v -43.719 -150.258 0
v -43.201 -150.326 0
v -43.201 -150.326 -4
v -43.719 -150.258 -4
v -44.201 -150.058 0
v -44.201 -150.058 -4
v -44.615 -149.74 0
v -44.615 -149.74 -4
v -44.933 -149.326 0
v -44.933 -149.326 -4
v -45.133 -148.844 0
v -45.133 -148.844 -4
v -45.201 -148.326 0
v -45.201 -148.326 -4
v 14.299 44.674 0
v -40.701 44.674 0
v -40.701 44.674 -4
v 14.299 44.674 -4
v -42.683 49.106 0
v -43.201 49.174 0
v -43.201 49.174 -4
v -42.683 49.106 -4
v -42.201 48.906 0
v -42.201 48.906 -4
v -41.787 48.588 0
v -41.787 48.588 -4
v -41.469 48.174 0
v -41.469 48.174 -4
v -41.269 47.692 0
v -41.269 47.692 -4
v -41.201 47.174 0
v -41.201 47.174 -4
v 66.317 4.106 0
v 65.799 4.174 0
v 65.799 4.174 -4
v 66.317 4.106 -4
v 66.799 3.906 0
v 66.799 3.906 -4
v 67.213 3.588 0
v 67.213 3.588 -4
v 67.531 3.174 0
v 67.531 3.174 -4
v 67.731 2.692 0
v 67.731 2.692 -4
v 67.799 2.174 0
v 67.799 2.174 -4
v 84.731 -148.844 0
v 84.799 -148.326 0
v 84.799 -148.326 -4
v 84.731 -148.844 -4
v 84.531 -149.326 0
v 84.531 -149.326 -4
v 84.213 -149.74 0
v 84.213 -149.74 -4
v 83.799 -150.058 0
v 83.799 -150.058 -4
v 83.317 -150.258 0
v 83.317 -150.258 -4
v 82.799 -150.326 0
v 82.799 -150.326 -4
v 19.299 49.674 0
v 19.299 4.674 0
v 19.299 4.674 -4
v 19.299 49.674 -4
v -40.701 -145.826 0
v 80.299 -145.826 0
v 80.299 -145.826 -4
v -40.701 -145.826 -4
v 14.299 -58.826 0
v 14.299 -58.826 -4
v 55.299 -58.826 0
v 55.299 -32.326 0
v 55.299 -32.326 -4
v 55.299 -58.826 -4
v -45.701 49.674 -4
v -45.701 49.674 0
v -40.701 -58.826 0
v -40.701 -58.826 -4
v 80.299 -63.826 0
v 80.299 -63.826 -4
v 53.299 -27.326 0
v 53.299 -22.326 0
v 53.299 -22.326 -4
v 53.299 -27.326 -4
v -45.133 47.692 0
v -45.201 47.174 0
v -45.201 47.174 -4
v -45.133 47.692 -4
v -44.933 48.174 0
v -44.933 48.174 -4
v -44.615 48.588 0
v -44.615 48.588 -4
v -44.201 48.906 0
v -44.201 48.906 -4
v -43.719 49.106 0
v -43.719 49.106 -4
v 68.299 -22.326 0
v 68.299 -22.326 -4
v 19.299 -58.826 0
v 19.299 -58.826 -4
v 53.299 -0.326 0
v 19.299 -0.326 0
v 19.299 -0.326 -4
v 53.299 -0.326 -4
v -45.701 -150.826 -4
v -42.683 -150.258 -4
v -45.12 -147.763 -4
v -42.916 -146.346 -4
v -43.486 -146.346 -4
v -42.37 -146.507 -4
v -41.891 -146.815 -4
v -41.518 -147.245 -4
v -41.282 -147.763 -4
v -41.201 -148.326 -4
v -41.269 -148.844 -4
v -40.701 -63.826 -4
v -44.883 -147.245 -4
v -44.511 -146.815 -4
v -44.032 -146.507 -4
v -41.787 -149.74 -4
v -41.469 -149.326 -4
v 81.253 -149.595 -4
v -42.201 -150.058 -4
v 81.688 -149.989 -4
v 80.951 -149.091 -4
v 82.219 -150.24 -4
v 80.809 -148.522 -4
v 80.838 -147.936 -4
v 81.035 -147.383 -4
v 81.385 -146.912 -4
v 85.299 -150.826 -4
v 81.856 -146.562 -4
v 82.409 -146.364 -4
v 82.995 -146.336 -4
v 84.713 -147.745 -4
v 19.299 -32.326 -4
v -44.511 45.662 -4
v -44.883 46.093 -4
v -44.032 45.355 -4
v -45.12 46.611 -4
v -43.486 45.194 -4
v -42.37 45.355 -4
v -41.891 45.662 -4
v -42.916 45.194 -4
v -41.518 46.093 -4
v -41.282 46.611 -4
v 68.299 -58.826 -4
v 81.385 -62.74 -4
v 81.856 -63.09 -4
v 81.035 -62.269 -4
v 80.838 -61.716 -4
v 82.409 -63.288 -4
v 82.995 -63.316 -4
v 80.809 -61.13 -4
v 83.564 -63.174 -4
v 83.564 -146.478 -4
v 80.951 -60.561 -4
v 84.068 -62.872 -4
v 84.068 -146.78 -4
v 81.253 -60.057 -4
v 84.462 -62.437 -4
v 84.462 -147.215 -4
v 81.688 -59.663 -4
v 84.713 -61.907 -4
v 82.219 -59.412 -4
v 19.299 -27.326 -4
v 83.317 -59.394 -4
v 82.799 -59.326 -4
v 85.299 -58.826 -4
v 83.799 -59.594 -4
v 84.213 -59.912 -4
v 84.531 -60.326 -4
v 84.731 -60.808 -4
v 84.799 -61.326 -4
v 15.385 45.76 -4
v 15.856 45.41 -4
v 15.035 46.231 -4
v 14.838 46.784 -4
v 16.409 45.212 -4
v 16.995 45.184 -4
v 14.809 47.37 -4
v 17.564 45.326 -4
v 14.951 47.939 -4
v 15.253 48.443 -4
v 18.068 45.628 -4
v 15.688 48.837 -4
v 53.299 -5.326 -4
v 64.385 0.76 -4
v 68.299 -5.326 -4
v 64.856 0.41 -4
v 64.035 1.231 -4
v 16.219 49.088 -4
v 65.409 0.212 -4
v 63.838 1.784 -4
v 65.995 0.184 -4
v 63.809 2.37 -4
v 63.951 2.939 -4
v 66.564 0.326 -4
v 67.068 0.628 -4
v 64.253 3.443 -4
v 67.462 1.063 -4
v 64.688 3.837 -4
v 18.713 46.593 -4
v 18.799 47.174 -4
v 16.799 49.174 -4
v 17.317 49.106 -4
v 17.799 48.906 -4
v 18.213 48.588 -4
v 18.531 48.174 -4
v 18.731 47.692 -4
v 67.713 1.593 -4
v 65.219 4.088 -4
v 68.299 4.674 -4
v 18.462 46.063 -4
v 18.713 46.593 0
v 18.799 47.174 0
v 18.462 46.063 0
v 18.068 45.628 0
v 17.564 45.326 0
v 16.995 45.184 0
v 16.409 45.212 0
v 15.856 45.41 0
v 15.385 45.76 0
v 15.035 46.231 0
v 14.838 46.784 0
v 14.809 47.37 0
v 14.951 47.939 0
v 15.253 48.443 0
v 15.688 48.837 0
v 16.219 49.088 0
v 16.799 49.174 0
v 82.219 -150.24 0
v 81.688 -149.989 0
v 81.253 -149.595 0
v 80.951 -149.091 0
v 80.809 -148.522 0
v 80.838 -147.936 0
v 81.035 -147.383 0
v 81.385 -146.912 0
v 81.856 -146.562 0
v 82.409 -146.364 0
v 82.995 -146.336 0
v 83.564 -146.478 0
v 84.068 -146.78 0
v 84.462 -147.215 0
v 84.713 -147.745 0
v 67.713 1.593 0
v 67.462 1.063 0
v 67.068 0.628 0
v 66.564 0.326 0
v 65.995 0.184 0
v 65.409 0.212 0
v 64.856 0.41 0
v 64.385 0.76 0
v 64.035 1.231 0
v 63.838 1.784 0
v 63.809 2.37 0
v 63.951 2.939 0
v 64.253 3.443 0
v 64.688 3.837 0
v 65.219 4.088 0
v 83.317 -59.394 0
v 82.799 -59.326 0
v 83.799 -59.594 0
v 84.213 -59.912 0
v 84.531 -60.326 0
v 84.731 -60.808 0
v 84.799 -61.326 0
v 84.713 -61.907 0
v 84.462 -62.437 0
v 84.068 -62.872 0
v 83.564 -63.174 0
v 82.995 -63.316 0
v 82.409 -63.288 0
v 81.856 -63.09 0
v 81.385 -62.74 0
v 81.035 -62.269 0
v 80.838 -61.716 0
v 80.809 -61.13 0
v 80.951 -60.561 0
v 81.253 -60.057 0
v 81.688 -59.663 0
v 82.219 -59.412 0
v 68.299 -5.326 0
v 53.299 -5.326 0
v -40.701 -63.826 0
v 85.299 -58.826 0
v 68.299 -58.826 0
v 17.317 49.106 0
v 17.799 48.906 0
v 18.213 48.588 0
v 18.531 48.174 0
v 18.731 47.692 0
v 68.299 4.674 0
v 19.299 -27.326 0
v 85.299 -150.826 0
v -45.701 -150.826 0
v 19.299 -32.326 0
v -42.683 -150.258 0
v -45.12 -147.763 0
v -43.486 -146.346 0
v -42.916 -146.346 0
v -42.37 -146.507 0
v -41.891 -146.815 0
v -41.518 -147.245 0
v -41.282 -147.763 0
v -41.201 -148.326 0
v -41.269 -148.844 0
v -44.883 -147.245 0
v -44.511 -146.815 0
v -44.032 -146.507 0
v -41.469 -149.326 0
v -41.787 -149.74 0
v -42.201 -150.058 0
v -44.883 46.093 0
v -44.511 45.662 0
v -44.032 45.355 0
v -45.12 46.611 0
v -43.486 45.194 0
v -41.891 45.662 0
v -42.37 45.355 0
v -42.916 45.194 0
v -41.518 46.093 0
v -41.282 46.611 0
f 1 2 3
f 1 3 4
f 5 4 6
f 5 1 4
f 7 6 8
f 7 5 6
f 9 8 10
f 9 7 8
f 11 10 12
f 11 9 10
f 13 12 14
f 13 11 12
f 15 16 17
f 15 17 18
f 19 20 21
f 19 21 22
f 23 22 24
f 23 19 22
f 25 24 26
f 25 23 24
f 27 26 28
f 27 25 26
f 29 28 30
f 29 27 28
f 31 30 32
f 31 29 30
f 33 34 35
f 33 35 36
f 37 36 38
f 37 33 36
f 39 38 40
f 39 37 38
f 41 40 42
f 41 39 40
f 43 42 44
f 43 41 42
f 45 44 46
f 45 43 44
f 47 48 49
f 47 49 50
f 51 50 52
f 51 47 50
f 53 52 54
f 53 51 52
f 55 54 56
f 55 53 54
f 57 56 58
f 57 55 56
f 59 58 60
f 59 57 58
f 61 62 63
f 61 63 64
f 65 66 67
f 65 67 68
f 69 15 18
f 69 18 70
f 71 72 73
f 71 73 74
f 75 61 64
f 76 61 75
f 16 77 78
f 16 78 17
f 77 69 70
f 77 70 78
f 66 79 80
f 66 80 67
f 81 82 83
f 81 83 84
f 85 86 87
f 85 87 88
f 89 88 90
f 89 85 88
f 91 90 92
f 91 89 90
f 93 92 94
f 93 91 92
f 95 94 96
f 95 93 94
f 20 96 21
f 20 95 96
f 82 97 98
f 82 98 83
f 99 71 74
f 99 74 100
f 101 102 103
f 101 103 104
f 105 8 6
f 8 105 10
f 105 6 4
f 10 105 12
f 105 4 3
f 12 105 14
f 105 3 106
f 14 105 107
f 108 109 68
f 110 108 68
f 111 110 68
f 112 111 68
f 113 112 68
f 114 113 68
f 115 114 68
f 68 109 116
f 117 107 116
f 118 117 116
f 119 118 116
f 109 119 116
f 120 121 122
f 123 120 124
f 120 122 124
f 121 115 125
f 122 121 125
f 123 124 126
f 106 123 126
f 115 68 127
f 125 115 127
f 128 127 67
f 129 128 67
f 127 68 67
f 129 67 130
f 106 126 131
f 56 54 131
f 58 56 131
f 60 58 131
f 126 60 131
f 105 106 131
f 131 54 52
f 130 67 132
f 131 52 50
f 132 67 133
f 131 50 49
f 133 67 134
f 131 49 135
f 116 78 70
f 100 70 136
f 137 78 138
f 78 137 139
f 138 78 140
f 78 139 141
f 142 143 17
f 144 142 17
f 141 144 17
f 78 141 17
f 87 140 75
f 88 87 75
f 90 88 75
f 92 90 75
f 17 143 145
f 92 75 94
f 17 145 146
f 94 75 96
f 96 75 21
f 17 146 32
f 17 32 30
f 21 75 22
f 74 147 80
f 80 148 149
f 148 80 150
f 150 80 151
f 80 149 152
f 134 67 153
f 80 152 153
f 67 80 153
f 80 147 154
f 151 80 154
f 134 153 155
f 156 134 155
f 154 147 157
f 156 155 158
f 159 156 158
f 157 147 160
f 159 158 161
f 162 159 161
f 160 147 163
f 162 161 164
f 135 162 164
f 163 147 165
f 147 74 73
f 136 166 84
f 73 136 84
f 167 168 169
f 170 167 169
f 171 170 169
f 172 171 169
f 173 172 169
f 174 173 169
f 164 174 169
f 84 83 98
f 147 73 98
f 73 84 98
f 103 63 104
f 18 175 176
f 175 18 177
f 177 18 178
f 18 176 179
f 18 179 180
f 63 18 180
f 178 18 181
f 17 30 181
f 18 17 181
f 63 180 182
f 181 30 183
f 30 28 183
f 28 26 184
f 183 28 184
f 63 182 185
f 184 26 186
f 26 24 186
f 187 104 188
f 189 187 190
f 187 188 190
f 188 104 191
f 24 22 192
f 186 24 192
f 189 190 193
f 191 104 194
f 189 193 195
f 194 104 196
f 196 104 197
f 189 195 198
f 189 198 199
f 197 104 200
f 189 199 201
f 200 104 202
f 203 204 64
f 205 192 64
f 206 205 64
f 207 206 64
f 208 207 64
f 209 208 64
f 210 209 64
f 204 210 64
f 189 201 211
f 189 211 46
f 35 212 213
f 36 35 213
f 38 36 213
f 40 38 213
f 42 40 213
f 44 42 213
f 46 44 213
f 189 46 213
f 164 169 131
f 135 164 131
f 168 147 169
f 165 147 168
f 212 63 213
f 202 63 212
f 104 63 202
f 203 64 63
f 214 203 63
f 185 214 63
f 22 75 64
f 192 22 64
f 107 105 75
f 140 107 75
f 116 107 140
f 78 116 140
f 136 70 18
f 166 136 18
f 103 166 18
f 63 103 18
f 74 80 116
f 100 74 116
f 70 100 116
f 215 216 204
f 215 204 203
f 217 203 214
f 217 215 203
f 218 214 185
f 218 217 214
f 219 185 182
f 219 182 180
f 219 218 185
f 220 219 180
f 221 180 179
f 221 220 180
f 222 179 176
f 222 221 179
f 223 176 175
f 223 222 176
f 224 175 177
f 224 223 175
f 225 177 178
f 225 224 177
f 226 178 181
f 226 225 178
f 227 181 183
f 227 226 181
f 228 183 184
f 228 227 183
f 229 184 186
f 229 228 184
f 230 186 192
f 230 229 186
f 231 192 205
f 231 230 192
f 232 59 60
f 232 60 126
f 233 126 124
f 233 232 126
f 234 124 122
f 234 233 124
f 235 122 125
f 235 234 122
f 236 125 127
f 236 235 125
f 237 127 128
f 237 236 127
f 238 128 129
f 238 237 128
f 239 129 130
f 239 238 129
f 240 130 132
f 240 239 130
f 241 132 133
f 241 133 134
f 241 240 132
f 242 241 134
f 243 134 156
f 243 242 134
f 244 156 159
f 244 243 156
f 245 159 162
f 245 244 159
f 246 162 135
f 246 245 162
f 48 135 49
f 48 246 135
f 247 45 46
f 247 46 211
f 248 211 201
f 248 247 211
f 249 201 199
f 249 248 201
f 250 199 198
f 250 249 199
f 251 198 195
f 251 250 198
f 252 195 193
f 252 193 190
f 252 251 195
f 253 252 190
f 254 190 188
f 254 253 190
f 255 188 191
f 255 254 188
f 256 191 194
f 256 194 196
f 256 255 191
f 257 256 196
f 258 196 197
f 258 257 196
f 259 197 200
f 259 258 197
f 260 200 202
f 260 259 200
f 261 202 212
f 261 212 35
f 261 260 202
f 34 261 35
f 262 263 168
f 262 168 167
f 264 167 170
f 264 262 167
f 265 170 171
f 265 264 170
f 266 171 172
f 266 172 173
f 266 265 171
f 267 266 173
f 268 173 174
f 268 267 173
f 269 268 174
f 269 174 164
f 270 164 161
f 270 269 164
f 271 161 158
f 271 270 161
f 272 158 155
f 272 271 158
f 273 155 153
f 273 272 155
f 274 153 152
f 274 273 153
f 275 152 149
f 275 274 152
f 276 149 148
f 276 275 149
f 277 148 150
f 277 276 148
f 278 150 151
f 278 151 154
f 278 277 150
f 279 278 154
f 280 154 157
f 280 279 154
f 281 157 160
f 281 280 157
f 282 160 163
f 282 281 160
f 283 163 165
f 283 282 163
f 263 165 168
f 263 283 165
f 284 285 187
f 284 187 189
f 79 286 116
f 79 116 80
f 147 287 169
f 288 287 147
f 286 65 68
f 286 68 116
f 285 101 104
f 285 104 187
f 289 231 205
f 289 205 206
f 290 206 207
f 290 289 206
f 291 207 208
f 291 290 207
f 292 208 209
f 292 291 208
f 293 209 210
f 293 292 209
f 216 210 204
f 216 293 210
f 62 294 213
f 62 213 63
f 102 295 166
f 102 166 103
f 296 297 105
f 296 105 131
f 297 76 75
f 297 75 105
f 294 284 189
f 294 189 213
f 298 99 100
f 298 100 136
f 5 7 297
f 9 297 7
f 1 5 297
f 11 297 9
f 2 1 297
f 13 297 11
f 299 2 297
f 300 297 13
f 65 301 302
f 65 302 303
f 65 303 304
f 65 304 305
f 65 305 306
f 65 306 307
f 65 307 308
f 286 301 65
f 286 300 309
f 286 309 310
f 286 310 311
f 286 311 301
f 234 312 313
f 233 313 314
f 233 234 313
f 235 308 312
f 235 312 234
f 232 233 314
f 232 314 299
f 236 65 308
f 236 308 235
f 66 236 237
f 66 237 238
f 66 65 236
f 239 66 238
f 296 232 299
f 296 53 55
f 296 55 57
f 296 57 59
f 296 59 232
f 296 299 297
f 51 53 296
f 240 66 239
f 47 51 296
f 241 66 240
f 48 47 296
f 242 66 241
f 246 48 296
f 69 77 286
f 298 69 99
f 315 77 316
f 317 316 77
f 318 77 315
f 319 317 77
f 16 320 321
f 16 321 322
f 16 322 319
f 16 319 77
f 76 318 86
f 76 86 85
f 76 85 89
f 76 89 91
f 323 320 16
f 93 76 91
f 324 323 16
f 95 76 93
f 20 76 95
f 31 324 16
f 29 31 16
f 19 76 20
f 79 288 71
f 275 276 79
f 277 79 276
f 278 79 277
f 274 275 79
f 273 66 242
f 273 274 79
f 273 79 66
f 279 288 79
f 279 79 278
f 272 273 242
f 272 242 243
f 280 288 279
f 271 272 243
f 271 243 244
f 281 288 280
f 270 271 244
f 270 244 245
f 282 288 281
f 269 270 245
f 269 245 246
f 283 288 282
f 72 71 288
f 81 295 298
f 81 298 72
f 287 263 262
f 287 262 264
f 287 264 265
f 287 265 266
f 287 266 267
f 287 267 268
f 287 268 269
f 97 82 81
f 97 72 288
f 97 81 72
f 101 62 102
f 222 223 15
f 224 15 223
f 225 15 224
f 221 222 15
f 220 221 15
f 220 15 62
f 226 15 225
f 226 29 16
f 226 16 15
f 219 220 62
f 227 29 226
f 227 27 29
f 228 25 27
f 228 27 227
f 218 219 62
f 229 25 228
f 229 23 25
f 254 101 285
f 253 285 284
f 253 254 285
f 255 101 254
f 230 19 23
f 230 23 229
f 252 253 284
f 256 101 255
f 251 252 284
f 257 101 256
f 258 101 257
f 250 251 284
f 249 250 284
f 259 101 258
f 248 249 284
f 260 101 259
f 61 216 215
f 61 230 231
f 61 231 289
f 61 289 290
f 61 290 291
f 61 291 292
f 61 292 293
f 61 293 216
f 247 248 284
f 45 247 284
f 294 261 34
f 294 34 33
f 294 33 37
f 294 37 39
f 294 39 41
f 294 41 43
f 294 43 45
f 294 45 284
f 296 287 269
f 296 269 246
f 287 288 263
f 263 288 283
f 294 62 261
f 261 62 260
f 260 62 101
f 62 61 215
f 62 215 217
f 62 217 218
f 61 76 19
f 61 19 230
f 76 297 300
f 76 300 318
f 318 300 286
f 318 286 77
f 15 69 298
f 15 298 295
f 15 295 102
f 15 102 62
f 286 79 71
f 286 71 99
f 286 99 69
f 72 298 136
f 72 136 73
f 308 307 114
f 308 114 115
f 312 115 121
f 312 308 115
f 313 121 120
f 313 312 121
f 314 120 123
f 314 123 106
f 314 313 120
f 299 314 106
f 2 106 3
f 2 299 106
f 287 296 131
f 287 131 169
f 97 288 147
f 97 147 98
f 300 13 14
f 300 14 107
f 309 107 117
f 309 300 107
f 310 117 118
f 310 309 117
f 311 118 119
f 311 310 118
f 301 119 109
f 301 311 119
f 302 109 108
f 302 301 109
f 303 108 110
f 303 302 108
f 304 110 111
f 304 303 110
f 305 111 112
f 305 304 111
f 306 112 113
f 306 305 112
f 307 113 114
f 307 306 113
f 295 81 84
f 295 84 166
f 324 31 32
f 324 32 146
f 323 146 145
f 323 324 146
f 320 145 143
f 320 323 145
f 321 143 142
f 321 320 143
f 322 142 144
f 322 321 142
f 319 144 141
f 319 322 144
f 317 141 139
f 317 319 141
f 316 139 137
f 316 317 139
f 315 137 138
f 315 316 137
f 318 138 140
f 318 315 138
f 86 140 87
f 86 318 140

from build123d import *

# Parameters (mm, degrees)
F0_W     = 5
F0_H     = 5
F1_DEPTH = 4


with BuildPart() as f1:
    # F0 (on Top) → F1 (new body)
    with BuildSketch(Plane.XY):
        with BuildLine():
            Line((82.7990943193, -150.3260023594), (82.7990943193, -150.8260023594))
            Line((82.7990943193, -150.8260023594), (85.2990943193, -150.8260023594))
            Line((85.2990943193, -150.8260023594), (85.2990943193, -148.3260023594))
            Line((85.2990943193, -148.3260023594), (84.7990943193, -148.3260023594))
            ThreePointArc((84.7990943193, -148.3260023594), (84.2133078817, -149.7402159218), (82.7990943193, -150.3260023594))
        make_face()
        with BuildLine():
            Line((-45.2009056807, -148.3260023594), (-45.7009056807, -148.3260023594))
            Line((-45.7009056807, -148.3260023594), (-45.7009056807, -150.8260023594))
            Line((-45.7009056807, -150.8260023594), (-43.2009056807, -150.8260023594))
            Line((-43.2009056807, -150.8260023594), (-43.2009056807, -150.3260023594))
            ThreePointArc((-43.2009056807, -150.3260023594), (-44.615119243, -149.7402159218), (-45.2009056807, -148.3260023594))
        make_face()
        with BuildLine():
            Line((-43.2009056807, 49.1739976406), (-43.2009056807, 49.6739976406))
            Line((-43.2009056807, 49.6739976406), (-45.7009056807, 49.6739976406))
            Line((-45.7009056807, 49.6739976406), (-45.7009056807, 47.1739976406))
            Line((-45.7009056807, 47.1739976406), (-45.2009056807, 47.1739976406))
            ThreePointArc((-45.2009056807, 47.1739976406), (-44.615119243, 48.588211203), (-43.2009056807, 49.1739976406))
        make_face()
        with BuildLine():
            Line((85.2990943193, -61.3260023594), (85.2990943193, -58.8260023594))
            Line((85.2990943193, -58.8260023594), (82.7990943193, -58.8260023594))
            Line((82.7990943193, -58.8260023594), (82.7990943193, -59.3260023594))
            ThreePointArc((82.7990943193, -59.3260023594), (84.2133078817, -59.911788797), (84.7990943193, -61.3260023594))
            Line((84.7990943193, -61.3260023594), (85.2990943193, -61.3260023594))
        make_face()
        with BuildLine():
            Line((19.2990943193, 49.6739976406), (16.7990943193, 49.6739976406))
            Line((16.7990943193, 49.6739976406), (16.7990943193, 49.1739976406))
            ThreePointArc((16.7990943193, 49.1739976406), (18.2133078817, 48.588211203), (18.7990943193, 47.1739976406))
            Line((18.7990943193, 47.1739976406), (19.2990943193, 47.1739976406))
            Line((19.2990943193, 47.1739976406), (19.2990943193, 49.6739976406))
        make_face()
        with BuildLine():
            Line((85.2990943193, -63.8260023594), (85.2990943193, -61.3260023594))
            Line((85.2990943193, -61.3260023594), (84.7990943193, -61.3260023594))
            ThreePointArc((84.7990943193, -61.3260023594), (81.384880757, -62.7402159218), (82.7990943193, -59.3260023594))
            Line((82.7990943193, -59.3260023594), (82.7990943193, -58.8260023594))
            Line((82.7990943193, -58.8260023594), (80.2990943193, -58.8260023594))
            Line((80.2990943193, -58.8260023594), (80.2990943193, -63.8260023594))
            Line((80.2990943193, -63.8260023594), (85.2990943193, -63.8260023594))
        make_face()
        with BuildLine():
            Line((14.2990943193, 49.6739976406), (14.2990943193, 44.6739976406))
            Line((14.2990943193, 44.6739976406), (16.7990943193, 44.6739976406))
            Line((16.7990943193, 44.6739976406), (19.2990943193, 44.6739976406))
            Line((19.2990943193, 44.6739976406), (19.2990943193, 47.1739976406))
            Line((19.2990943193, 47.1739976406), (18.7990943193, 47.1739976406))
            ThreePointArc((18.7990943193, 47.1739976406), (15.384880757, 45.7597840782), (16.7990943193, 49.1739976406))
            Line((16.7990943193, 49.1739976406), (16.7990943193, 49.6739976406))
            Line((16.7990943193, 49.6739976406), (14.2990943193, 49.6739976406))
        make_face()
        with BuildLine():
            Line((-37.7009056807, -58.8260023594), (-40.7009056807, -58.8260023594))
            Line((-40.7009056807, -58.8260023594), (-40.7009056807, -52.8260023594))
            Line((-40.7009056807, -52.8260023594), (-40.7009056807, 28.4739976406))
            Line((-40.7009056807, 28.4739976406), (-40.7009056807, 44.6739976406))
            Line((-40.7009056807, 44.6739976406), (14.2990943193, 44.6739976406))
            Line((14.2990943193, 44.6739976406), (14.2990943193, 49.6739976406))
            Line((14.2990943193, 49.6739976406), (-43.2009056807, 49.6739976406))
            Line((-43.2009056807, 49.6739976406), (-43.2009056807, 49.1739976406))
            ThreePointArc((-43.2009056807, 49.1739976406), (-41.7866921183, 48.588211203), (-41.2009056807, 47.1739976406))
            ThreePointArc((-41.2009056807, 47.1739976406), (-43.2009056807, 45.1739976406), (-45.2009056807, 47.1739976406))
            Line((-45.2009056807, 47.1739976406), (-45.7009056807, 47.1739976406))
            Line((-45.7009056807, 47.1739976406), (-45.7009056807, -148.3260023594))
            Line((-45.7009056807, -148.3260023594), (-45.2009056807, -148.3260023594))
            ThreePointArc((-45.2009056807, -148.3260023594), (-43.2009056807, -146.3260023594), (-41.2009056807, -148.3260023594))
            ThreePointArc((-41.2009056807, -148.3260023594), (-41.7866921183, -149.7402159218), (-43.2009056807, -150.3260023594))
            Line((-43.2009056807, -150.3260023594), (-43.2009056807, -150.8260023594))
            Line((-43.2009056807, -150.8260023594), (82.7990943193, -150.8260023594))
            Line((82.7990943193, -150.8260023594), (82.7990943193, -150.3260023594))
            ThreePointArc((82.7990943193, -150.3260023594), (81.384880757, -146.911788797), (84.7990943193, -148.3260023594))
            Line((84.7990943193, -148.3260023594), (85.2990943193, -148.3260023594))
            Line((85.2990943193, -148.3260023594), (85.2990943193, -63.8260023594))
            Line((85.2990943193, -63.8260023594), (80.2990943193, -63.8260023594))
            Line((80.2990943193, -63.8260023594), (80.2990943193, -58.8260023594))
            Line((80.2990943193, -58.8260023594), (68.2990943193, -58.8260023594))
            Line((68.2990943193, -58.8260023594), (68.2990943193, -22.3260023594))
            Line((68.2990943193, -22.3260023594), (63.2990943193, -22.3260023594))
            Line((63.2990943193, -22.3260023594), (53.2990943193, -22.3260023594))
            Line((53.2990943193, -22.3260023594), (53.2990943193, -25.3760023594))
            Line((53.2990943193, -25.3760023594), (53.2990943193, -27.3260023594))
            Line((53.2990943193, -27.3260023594), (51.3490943193, -27.3260023594))
            Line((51.3490943193, -27.3260023594), (28.5490943193, -27.3260023594))
            Line((28.5490943193, -27.3260023594), (19.2990943193, -27.3260023594))
            Line((19.2990943193, -27.3260023594), (19.2990943193, -25.3760023594))
            Line((19.2990943193, -25.3760023594), (19.2990943193, -2.2760023594))
            Line((19.2990943193, -2.2760023594), (19.2990943193, -0.3260023594))
            Line((19.2990943193, -0.3260023594), (14.2990943193, -0.3260023594))
            Line((14.2990943193, -0.3260023594), (14.2990943193, -27.3260023594))
            Line((14.2990943193, -27.3260023594), (14.2990943193, -32.3260023594))
            Line((14.2990943193, -32.3260023594), (14.2990943193, -47.2260023594))
            Line((14.2990943193, -47.2260023594), (14.2990943193, -58.8260023594))
            Line((14.2990943193, -58.8260023594), (11.2990943193, -58.8260023594))
            Line((11.2990943193, -58.8260023594), (-37.7009056807, -58.8260023594))
        make_face()
        Polygon((76.8990943193, -63.8260023594), (80.2990943193, -63.8260023594), (80.2990943193, -67.2260023594), (80.2990943193, -142.4260023594), (80.2990943193, -145.8260023594), (76.8990943193, -145.8260023594), (-37.3009056807, -145.8260023594), (-40.7009056807, -145.8260023594), (-40.7009056807, -142.4260023594), (-40.7009056807, -67.2260023594), (-40.7009056807, -63.8260023594), (-37.3009056807, -63.8260023594), (14.2990943193, -63.8260023594), (19.2990943193, -63.8260023594), align=None, mode=Mode.SUBTRACT)
        Polygon((53.5990943193, -58.8260023594), (19.2990943193, -58.8260023594), (19.2990943193, -32.3260023594), (53.5990943193, -32.3260023594), (55.2990943193, -32.3260023594), (55.2990943193, -34.0260023594), (55.2990943193, -57.1260023594), (55.2990943193, -58.8260023594), align=None, mode=Mode.SUBTRACT)
        with Locations((16.7990943193, 2.1739976406)):
            Rectangle(F0_W, F0_H)
        Polygon((16.7990943193, 44.6739976406), (14.2990943193, 44.6739976406), (14.2990943193, 29.8739976406), (14.2990943193, 4.6739976406), (19.2990943193, 4.6739976406), (19.2990943193, 44.6739976406), align=None)
        with BuildLine():
            Line((65.7990943193, 4.6739976406), (19.2990943193, 4.6739976406))
            Line((19.2990943193, 4.6739976406), (19.2990943193, -0.3260023594))
            Line((19.2990943193, -0.3260023594), (28.5490943193, -0.3260023594))
            Line((28.5490943193, -0.3260023594), (51.3490943193, -0.3260023594))
            Line((51.3490943193, -0.3260023594), (53.2990943193, -0.3260023594))
            Line((53.2990943193, -0.3260023594), (53.2990943193, -2.2760023594))
            Line((53.2990943193, -2.2760023594), (53.2990943193, -5.3260023594))
            Line((53.2990943193, -5.3260023594), (63.2990943193, -5.3260023594))
            Line((63.2990943193, -5.3260023594), (68.2990943193, -5.3260023594))
            Line((68.2990943193, -5.3260023594), (68.2990943193, 2.1739976406))
            Line((68.2990943193, 2.1739976406), (67.7990943193, 2.1739976406))
            ThreePointArc((67.7990943193, 2.1739976406), (64.384880757, 0.7597840782), (65.7990943193, 4.1739976406))
            Line((65.7990943193, 4.1739976406), (65.7990943193, 4.6739976406))
        make_face()
        with BuildLine():
            Line((68.2990943193, 4.6739976406), (65.7990943193, 4.6739976406))
            Line((65.7990943193, 4.6739976406), (65.7990943193, 4.1739976406))
            ThreePointArc((65.7990943193, 4.1739976406), (67.2133078817, 3.588211203), (67.7990943193, 2.1739976406))
            Line((67.7990943193, 2.1739976406), (68.2990943193, 2.1739976406))
            Line((68.2990943193, 2.1739976406), (68.2990943193, 4.6739976406))
        make_face()
    extrude(amount=-F1_DEPTH)


solid = f1.part
